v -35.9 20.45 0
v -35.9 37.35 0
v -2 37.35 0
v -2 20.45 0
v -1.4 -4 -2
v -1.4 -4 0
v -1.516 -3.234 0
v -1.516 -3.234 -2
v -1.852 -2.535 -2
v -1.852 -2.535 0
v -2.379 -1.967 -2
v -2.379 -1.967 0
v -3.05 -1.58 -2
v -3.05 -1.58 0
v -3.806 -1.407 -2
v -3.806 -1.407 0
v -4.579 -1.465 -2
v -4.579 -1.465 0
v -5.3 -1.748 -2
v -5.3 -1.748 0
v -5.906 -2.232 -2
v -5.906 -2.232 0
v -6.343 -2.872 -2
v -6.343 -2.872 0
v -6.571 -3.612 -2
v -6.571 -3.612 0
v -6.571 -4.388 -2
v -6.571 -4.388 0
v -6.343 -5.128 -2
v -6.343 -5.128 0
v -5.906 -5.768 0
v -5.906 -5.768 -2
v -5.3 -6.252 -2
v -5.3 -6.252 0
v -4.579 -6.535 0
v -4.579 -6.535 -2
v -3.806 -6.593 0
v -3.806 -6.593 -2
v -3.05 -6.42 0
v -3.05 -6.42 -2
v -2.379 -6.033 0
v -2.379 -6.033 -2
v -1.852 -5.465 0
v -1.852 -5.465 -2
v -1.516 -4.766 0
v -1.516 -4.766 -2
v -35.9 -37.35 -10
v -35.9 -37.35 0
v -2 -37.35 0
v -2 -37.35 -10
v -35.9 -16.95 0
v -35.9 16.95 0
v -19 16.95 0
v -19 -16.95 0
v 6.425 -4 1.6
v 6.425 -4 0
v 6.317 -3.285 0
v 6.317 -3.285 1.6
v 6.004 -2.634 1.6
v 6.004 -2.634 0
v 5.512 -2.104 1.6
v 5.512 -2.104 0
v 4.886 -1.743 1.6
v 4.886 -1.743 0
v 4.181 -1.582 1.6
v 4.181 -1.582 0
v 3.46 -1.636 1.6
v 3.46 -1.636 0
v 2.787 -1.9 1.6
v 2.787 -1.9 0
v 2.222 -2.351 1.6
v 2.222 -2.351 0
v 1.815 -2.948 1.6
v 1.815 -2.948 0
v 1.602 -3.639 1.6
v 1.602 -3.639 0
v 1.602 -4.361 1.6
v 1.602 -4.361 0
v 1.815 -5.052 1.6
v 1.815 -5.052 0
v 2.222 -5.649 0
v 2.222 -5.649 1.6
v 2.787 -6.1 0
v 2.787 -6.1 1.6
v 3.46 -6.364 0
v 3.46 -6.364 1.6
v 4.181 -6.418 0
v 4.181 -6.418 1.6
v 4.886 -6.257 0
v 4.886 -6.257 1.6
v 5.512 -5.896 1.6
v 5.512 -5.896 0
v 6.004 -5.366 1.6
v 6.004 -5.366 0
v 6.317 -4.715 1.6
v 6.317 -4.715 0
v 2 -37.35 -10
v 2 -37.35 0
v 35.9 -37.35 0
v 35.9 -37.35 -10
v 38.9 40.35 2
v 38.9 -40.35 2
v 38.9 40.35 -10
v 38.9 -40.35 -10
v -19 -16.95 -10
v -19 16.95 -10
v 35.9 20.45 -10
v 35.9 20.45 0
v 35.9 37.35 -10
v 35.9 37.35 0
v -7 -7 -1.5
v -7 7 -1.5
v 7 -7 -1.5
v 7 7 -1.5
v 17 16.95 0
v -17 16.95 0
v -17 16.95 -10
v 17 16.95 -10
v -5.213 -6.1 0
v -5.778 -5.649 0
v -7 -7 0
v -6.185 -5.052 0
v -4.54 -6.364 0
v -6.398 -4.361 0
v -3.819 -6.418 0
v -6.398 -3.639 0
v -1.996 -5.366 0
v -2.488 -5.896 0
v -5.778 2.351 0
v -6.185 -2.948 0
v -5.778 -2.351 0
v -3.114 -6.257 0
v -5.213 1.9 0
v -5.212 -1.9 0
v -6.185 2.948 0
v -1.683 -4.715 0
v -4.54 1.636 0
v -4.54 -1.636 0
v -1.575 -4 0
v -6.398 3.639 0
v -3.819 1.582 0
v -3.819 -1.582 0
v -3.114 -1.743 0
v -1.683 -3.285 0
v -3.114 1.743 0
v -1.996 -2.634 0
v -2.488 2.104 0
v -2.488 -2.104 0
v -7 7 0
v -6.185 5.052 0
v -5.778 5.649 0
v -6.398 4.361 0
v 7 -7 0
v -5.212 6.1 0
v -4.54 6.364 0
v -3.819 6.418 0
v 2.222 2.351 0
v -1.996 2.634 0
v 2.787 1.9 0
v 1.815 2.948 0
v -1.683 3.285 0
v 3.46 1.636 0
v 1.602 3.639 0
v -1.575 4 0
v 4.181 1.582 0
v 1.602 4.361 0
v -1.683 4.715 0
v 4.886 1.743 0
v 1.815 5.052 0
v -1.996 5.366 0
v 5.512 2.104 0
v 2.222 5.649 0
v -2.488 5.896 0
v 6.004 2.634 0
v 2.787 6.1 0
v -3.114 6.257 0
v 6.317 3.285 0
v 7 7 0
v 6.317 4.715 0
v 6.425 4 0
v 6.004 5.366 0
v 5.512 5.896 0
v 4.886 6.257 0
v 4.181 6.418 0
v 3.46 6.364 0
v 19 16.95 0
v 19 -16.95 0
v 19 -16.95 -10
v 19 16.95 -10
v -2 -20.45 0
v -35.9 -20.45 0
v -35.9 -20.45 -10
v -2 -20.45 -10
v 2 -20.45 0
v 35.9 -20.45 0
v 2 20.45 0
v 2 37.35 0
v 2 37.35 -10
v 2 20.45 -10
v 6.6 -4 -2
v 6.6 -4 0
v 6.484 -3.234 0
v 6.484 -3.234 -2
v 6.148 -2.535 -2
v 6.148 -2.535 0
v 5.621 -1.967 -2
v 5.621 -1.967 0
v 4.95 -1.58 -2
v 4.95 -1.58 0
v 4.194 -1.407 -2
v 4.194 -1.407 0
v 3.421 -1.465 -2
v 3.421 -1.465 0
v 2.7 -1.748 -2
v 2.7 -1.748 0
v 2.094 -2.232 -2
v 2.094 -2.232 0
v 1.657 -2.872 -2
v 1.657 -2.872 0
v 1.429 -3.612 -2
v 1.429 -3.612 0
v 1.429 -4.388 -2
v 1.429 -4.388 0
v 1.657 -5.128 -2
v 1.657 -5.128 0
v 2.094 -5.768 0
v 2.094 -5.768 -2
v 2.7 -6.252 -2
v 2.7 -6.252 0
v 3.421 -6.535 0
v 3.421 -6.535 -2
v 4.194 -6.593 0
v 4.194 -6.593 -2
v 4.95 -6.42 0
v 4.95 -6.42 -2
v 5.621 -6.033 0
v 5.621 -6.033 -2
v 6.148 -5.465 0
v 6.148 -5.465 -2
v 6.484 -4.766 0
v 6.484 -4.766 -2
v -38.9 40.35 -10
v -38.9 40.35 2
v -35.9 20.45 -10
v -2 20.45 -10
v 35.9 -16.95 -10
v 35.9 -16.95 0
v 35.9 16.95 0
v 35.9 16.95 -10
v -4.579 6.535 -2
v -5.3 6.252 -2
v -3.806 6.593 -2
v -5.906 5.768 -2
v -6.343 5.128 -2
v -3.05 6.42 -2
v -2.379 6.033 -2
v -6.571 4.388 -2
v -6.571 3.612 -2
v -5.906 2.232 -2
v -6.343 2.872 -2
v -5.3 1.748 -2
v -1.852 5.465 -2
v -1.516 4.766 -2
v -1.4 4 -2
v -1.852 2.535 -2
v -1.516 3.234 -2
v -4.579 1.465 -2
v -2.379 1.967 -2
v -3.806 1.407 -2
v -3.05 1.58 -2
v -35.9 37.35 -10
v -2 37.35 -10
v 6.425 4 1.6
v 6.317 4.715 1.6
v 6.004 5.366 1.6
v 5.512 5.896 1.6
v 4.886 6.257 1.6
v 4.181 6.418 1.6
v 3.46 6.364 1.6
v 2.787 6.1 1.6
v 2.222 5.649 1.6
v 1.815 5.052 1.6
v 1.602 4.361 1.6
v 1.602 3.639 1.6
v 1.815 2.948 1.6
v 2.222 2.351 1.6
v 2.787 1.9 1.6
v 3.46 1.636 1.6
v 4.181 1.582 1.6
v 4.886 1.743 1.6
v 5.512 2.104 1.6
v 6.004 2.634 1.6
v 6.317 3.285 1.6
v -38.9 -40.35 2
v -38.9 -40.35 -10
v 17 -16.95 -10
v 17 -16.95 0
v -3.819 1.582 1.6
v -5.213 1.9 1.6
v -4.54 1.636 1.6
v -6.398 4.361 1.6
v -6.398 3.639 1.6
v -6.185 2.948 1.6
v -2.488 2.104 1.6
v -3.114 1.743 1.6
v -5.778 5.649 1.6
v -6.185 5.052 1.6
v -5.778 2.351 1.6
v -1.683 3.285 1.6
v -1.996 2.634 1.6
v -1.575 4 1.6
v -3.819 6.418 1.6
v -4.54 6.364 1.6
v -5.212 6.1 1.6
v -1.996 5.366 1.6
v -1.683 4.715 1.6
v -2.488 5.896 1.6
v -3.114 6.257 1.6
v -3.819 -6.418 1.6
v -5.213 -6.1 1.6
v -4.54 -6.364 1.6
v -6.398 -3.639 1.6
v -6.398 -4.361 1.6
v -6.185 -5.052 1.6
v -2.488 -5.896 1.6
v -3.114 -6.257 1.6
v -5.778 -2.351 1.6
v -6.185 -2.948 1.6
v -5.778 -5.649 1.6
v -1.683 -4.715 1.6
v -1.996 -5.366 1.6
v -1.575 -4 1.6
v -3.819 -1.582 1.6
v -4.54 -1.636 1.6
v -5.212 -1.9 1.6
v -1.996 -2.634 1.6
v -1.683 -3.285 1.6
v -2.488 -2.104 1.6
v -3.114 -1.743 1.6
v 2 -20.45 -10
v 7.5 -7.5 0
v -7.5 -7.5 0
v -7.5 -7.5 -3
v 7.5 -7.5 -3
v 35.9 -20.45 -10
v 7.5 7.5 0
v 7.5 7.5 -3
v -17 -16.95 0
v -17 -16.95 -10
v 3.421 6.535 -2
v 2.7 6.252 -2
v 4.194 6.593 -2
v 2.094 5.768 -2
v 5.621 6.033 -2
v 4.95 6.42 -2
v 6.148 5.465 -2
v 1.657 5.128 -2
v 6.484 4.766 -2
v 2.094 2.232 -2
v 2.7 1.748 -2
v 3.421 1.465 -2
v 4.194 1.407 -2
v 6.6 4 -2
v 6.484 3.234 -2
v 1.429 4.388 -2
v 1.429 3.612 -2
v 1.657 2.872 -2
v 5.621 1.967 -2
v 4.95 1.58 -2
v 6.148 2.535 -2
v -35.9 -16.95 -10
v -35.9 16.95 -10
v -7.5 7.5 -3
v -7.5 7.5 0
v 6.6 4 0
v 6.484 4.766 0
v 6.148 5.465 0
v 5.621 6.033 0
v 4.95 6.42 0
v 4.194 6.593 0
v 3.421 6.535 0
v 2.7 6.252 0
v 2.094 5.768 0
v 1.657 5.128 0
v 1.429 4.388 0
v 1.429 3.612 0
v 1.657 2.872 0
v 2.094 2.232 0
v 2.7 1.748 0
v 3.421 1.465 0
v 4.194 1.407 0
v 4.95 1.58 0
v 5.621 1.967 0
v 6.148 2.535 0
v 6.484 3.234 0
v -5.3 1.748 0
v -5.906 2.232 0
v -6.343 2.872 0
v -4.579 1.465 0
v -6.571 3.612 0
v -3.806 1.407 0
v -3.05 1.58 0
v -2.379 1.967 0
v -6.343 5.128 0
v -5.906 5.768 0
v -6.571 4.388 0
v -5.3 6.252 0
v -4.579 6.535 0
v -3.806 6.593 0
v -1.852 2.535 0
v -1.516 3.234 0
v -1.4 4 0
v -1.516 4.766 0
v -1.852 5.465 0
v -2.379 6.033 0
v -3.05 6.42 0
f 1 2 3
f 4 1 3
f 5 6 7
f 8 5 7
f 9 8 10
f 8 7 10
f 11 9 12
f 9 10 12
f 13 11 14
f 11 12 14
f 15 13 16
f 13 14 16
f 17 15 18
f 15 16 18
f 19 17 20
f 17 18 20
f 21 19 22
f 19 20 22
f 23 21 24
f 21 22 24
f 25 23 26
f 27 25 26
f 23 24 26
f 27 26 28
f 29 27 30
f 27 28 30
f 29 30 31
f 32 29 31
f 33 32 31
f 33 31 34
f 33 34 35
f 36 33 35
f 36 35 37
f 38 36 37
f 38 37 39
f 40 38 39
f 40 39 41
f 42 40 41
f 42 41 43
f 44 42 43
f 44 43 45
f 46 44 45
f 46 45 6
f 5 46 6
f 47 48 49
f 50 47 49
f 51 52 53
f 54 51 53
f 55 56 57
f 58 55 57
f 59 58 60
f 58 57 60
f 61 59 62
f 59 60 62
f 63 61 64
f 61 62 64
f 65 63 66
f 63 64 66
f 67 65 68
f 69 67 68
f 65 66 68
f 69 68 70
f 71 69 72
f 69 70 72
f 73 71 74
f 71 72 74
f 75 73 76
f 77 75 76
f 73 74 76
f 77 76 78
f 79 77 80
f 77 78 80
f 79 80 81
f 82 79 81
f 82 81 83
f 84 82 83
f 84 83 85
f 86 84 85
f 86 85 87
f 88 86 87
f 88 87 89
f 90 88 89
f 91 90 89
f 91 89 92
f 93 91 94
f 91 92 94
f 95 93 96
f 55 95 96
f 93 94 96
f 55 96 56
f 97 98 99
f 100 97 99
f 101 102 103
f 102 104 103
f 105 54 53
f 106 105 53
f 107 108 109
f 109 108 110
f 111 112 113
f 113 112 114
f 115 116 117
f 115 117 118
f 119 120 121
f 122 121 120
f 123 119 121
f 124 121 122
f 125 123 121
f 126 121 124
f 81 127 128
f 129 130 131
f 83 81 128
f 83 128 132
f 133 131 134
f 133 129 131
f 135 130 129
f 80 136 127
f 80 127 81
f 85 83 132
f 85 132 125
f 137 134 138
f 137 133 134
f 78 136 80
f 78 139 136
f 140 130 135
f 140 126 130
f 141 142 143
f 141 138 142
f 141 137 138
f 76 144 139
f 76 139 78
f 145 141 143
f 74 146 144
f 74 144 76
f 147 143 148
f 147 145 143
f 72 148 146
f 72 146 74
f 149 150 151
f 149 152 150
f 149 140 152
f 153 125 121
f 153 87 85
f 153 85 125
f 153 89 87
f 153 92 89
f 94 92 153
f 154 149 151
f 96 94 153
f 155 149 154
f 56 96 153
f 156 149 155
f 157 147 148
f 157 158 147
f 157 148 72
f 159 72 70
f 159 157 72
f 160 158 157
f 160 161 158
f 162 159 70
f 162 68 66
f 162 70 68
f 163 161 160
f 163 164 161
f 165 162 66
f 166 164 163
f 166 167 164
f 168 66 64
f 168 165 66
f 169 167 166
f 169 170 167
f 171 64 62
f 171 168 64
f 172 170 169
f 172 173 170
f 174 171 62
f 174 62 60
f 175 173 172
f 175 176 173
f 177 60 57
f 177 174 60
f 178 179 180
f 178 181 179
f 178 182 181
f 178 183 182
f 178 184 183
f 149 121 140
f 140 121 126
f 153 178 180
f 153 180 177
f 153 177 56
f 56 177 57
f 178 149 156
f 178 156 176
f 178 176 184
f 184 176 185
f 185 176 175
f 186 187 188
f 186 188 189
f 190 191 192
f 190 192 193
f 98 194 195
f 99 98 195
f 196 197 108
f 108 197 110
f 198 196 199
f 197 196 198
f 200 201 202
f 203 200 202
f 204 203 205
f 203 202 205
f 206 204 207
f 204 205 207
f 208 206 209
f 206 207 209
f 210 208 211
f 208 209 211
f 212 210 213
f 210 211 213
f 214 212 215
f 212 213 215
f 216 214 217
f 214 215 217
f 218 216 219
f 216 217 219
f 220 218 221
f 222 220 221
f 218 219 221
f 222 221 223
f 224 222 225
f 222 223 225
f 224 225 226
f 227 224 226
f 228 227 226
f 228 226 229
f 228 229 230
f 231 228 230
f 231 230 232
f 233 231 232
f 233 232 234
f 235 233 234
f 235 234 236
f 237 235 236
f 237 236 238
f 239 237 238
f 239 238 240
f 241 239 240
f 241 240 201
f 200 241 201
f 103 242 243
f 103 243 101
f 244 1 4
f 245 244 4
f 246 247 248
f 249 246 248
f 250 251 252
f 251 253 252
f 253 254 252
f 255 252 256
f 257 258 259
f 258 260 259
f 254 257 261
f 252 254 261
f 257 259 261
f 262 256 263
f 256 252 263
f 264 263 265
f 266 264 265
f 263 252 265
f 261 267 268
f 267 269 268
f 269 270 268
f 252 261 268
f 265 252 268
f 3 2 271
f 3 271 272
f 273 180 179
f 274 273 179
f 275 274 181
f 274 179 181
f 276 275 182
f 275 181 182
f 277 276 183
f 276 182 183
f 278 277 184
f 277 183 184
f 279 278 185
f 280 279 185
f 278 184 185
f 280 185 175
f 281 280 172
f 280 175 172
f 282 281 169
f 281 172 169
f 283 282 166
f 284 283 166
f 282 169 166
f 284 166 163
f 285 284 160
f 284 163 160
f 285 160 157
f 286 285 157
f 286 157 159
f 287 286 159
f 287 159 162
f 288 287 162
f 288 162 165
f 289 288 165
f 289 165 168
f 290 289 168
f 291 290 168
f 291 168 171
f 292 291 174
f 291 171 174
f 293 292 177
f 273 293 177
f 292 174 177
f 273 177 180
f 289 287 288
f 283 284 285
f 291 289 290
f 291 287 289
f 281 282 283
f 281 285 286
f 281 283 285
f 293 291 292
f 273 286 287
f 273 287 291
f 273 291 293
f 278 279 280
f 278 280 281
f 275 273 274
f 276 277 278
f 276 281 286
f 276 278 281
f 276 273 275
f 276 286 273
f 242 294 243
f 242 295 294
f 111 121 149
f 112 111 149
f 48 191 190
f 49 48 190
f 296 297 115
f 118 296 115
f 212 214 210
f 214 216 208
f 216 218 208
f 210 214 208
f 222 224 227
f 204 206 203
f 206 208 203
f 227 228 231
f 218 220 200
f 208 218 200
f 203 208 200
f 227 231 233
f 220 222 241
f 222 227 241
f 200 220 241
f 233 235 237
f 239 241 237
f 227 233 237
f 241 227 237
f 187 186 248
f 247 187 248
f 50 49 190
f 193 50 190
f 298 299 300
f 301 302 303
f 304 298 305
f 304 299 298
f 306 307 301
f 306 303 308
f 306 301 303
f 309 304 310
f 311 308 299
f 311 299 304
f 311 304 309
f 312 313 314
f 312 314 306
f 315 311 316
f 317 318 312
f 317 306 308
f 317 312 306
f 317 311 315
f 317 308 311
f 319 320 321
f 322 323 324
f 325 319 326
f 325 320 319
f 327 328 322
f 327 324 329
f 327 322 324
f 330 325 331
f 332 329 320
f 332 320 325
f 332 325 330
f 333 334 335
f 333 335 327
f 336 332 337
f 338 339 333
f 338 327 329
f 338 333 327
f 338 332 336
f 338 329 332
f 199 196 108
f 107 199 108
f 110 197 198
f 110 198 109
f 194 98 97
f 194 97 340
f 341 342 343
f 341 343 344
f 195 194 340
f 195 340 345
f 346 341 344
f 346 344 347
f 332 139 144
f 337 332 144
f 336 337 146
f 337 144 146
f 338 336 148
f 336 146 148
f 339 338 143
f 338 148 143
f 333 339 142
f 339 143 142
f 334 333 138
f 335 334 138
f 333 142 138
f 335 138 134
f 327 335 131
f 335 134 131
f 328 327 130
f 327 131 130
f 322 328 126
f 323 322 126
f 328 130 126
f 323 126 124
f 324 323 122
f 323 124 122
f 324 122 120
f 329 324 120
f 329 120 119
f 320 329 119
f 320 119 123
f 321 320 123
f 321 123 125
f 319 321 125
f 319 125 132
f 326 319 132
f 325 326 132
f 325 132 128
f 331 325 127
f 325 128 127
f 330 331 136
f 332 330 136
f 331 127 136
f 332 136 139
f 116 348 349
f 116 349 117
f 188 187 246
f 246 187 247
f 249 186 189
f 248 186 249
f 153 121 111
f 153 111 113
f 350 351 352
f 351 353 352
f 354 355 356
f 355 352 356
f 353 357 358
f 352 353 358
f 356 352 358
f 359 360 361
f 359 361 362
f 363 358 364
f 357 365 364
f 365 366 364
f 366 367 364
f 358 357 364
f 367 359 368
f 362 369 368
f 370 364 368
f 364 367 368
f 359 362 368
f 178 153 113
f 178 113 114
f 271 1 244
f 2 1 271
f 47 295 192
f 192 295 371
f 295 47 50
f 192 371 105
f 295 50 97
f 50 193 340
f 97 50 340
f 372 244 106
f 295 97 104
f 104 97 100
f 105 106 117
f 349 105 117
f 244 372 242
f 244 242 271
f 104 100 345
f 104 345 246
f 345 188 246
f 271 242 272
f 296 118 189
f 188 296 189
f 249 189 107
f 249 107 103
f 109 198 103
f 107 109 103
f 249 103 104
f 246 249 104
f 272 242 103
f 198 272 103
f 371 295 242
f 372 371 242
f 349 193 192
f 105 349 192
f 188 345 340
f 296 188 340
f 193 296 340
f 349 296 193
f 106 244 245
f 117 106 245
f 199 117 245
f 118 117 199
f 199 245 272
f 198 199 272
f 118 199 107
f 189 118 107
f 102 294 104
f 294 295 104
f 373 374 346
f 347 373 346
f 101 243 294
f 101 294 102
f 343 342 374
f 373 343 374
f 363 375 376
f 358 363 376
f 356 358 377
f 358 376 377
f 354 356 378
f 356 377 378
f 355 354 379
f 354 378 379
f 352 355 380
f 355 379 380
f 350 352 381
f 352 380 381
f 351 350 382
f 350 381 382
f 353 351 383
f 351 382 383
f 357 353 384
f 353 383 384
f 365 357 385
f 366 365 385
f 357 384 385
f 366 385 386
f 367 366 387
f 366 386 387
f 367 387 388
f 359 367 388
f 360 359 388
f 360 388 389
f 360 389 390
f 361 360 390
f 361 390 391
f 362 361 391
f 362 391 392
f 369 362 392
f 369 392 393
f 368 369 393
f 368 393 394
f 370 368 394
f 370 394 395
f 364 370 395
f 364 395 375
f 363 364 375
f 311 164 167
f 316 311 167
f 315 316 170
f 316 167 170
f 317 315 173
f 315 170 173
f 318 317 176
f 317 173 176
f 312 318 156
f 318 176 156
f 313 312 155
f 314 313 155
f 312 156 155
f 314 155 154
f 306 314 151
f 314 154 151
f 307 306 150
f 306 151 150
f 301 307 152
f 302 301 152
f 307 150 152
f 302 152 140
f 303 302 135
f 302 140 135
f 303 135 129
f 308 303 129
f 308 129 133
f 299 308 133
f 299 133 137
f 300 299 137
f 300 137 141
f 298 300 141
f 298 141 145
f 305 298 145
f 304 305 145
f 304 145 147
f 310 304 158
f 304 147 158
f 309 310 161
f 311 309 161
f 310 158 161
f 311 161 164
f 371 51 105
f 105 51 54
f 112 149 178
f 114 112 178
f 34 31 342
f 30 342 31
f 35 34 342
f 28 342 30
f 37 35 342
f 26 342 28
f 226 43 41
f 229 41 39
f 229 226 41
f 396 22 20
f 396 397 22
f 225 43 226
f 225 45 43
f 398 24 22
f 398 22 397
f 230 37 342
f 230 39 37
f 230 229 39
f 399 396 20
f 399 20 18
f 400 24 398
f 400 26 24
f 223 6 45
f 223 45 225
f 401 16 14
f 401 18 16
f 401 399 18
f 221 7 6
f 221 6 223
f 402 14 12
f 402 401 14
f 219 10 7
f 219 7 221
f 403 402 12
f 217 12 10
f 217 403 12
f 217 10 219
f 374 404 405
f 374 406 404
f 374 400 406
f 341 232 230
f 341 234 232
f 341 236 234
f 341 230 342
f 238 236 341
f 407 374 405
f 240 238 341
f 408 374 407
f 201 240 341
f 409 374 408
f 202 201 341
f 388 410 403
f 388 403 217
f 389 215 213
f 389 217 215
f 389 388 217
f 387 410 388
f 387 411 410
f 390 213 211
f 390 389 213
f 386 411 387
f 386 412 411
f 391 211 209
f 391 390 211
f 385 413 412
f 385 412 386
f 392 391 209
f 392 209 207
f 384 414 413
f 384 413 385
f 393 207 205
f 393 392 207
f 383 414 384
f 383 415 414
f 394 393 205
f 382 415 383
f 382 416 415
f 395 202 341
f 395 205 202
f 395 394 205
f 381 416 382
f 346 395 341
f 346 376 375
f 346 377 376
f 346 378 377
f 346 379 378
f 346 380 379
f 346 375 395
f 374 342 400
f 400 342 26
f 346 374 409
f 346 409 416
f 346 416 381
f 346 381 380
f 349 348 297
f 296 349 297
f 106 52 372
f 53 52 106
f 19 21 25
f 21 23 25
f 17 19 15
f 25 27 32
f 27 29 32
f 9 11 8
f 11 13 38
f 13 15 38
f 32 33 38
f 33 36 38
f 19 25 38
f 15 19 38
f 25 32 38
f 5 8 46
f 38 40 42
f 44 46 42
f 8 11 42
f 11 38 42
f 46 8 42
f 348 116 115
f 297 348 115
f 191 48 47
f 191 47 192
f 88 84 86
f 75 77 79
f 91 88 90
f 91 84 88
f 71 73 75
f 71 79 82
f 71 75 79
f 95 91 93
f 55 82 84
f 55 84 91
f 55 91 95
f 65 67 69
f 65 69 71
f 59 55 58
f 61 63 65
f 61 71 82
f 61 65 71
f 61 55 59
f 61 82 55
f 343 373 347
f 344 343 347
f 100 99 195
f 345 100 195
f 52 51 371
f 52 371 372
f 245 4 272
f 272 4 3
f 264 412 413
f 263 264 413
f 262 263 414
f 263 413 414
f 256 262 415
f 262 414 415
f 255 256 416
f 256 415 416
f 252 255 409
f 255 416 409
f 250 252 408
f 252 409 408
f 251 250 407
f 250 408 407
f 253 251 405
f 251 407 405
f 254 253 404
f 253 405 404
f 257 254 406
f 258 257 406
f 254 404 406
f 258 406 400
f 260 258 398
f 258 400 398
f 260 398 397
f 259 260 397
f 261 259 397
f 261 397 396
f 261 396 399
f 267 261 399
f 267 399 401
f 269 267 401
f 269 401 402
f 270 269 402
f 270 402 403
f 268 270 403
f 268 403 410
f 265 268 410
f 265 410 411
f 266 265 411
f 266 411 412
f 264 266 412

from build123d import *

# Parameters (mm, degrees)
F0_W      = 33.9
F0_H      = 16.9
F0_W_2    = 16.9
F0_H_2    = 33.9
F0_W_3    = 34
F1_DEPTH  = 10
F2_W      = 77.8
F2_H      = 80.7
F3_DEPTH  = 2
F4_R      = 2.425
F5_DEPTH  = 1.6
F6_W      = 14
F6_H      = 14
F7_DEPTH  = 1.5
F8_W      = 15
F8_H      = 15
F8_R      = 2.6
F9_DEPTH  = 3
F10_W     = 15
F10_H     = 15
F11_DEPTH = 1


with BuildPart() as f1:
    # F0 (on Top) → F1 (new body)
    with BuildSketch(Plane.XY):
        Polygon((-38.9, 20.45), (-38.9, -20.45), (-38.9, -37.35), (-38.9, -40.35), (38.9, -40.35), (38.9, -37.35), (38.9, -20.45), (38.9, 20.45), (38.9, 37.35), (38.9, 40.35), (-38.9, 40.35), (-38.9, 37.35), align=None)
        with Locations((-18.95, -28.9)):
            Rectangle(F0_W, F0_H, mode=Mode.SUBTRACT)
        with Locations((-27.45, 0)):
            Rectangle(F0_W_2, F0_H_2, mode=Mode.SUBTRACT)
        with Locations((18.95, -28.9)):
            Rectangle(F0_W, F0_H, mode=Mode.SUBTRACT)
        Rectangle(F0_W_3, F0_H_2, mode=Mode.SUBTRACT)
        with Locations((27.45, 0)):
            Rectangle(F0_W_2, F0_H_2, mode=Mode.SUBTRACT)
        with Locations((-18.95, 28.9)):
            Rectangle(F0_W, F0_H, mode=Mode.SUBTRACT)
        with Locations((18.95, 28.9)):
            Rectangle(F0_W, F0_H, mode=Mode.SUBTRACT)
    extrude(amount=-F1_DEPTH)

    # F2 (on Top) → F3 (join)
    with BuildSketch(Plane.XY):
        Rectangle(F2_W, F2_H)
    extrude(amount=F3_DEPTH)


with BuildPart() as f5:
    # F4 (on Top) → F5 (new body)
    with BuildSketch(Plane.XY):
        with Locations((-4, 4)):
            Circle(F4_R)
    extrude(amount=F5_DEPTH)



with BuildPart() as f5b:
    # F4 (on Top) → F5, piece 2 (new body)
    with BuildSketch(Plane.XY):
        with Locations((4, 4)):
            Circle(F4_R)
    extrude(amount=F5_DEPTH)


with BuildPart() as f5c:
    # F4 (on Top) → F5, piece 3 (new body)
    with BuildSketch(Plane.XY):
        with Locations((-4, -4)):
            Circle(F4_R)
    extrude(amount=F5_DEPTH)


with BuildPart() as f5d:
    # F4 (on Top) → F5, piece 4 (new body)
    with BuildSketch(Plane.XY):
        with Locations((4, -4)):
            Circle(F4_R)
    extrude(amount=F5_DEPTH)


with BuildPart() as f5_1:
    add(f5.part)

    add(f5b.part)  # F7 merges F5b

    add(f5c.part)  # F7 merges F5c

    add(f5d.part)  # F7 merges F5d
    # F6 (on Top) → F7 (join)
    with BuildSketch(Plane.XY):
        Rectangle(F6_W, F6_H)
    extrude(amount=-F7_DEPTH)


with BuildPart() as f9:
    # F8 (on Top) → F9 (new body)
    with BuildSketch(Plane.XY):
        Rectangle(F8_W, F8_H)
        with Locations((-4, -4)):
            Circle(F8_R, mode=Mode.SUBTRACT)
        with Locations((4, -4)):
            Circle(F8_R, mode=Mode.SUBTRACT)
        with Locations((-4, 4)):
            Circle(F8_R, mode=Mode.SUBTRACT)
        with Locations((4, 4)):
            Circle(F8_R, mode=Mode.SUBTRACT)
    extrude(amount=-F9_DEPTH)

    # F10 (on face) → F11 (join)
    with BuildSketch(Plane(origin=(0, 0, -3), x_dir=(1, 0, 0), z_dir=(0, 0, -1))):
        Rectangle(F10_W, F10_H)
    extrude(amount=-F11_DEPTH)


solid = Compound([f1.part, f5_1.part, f9.part])
